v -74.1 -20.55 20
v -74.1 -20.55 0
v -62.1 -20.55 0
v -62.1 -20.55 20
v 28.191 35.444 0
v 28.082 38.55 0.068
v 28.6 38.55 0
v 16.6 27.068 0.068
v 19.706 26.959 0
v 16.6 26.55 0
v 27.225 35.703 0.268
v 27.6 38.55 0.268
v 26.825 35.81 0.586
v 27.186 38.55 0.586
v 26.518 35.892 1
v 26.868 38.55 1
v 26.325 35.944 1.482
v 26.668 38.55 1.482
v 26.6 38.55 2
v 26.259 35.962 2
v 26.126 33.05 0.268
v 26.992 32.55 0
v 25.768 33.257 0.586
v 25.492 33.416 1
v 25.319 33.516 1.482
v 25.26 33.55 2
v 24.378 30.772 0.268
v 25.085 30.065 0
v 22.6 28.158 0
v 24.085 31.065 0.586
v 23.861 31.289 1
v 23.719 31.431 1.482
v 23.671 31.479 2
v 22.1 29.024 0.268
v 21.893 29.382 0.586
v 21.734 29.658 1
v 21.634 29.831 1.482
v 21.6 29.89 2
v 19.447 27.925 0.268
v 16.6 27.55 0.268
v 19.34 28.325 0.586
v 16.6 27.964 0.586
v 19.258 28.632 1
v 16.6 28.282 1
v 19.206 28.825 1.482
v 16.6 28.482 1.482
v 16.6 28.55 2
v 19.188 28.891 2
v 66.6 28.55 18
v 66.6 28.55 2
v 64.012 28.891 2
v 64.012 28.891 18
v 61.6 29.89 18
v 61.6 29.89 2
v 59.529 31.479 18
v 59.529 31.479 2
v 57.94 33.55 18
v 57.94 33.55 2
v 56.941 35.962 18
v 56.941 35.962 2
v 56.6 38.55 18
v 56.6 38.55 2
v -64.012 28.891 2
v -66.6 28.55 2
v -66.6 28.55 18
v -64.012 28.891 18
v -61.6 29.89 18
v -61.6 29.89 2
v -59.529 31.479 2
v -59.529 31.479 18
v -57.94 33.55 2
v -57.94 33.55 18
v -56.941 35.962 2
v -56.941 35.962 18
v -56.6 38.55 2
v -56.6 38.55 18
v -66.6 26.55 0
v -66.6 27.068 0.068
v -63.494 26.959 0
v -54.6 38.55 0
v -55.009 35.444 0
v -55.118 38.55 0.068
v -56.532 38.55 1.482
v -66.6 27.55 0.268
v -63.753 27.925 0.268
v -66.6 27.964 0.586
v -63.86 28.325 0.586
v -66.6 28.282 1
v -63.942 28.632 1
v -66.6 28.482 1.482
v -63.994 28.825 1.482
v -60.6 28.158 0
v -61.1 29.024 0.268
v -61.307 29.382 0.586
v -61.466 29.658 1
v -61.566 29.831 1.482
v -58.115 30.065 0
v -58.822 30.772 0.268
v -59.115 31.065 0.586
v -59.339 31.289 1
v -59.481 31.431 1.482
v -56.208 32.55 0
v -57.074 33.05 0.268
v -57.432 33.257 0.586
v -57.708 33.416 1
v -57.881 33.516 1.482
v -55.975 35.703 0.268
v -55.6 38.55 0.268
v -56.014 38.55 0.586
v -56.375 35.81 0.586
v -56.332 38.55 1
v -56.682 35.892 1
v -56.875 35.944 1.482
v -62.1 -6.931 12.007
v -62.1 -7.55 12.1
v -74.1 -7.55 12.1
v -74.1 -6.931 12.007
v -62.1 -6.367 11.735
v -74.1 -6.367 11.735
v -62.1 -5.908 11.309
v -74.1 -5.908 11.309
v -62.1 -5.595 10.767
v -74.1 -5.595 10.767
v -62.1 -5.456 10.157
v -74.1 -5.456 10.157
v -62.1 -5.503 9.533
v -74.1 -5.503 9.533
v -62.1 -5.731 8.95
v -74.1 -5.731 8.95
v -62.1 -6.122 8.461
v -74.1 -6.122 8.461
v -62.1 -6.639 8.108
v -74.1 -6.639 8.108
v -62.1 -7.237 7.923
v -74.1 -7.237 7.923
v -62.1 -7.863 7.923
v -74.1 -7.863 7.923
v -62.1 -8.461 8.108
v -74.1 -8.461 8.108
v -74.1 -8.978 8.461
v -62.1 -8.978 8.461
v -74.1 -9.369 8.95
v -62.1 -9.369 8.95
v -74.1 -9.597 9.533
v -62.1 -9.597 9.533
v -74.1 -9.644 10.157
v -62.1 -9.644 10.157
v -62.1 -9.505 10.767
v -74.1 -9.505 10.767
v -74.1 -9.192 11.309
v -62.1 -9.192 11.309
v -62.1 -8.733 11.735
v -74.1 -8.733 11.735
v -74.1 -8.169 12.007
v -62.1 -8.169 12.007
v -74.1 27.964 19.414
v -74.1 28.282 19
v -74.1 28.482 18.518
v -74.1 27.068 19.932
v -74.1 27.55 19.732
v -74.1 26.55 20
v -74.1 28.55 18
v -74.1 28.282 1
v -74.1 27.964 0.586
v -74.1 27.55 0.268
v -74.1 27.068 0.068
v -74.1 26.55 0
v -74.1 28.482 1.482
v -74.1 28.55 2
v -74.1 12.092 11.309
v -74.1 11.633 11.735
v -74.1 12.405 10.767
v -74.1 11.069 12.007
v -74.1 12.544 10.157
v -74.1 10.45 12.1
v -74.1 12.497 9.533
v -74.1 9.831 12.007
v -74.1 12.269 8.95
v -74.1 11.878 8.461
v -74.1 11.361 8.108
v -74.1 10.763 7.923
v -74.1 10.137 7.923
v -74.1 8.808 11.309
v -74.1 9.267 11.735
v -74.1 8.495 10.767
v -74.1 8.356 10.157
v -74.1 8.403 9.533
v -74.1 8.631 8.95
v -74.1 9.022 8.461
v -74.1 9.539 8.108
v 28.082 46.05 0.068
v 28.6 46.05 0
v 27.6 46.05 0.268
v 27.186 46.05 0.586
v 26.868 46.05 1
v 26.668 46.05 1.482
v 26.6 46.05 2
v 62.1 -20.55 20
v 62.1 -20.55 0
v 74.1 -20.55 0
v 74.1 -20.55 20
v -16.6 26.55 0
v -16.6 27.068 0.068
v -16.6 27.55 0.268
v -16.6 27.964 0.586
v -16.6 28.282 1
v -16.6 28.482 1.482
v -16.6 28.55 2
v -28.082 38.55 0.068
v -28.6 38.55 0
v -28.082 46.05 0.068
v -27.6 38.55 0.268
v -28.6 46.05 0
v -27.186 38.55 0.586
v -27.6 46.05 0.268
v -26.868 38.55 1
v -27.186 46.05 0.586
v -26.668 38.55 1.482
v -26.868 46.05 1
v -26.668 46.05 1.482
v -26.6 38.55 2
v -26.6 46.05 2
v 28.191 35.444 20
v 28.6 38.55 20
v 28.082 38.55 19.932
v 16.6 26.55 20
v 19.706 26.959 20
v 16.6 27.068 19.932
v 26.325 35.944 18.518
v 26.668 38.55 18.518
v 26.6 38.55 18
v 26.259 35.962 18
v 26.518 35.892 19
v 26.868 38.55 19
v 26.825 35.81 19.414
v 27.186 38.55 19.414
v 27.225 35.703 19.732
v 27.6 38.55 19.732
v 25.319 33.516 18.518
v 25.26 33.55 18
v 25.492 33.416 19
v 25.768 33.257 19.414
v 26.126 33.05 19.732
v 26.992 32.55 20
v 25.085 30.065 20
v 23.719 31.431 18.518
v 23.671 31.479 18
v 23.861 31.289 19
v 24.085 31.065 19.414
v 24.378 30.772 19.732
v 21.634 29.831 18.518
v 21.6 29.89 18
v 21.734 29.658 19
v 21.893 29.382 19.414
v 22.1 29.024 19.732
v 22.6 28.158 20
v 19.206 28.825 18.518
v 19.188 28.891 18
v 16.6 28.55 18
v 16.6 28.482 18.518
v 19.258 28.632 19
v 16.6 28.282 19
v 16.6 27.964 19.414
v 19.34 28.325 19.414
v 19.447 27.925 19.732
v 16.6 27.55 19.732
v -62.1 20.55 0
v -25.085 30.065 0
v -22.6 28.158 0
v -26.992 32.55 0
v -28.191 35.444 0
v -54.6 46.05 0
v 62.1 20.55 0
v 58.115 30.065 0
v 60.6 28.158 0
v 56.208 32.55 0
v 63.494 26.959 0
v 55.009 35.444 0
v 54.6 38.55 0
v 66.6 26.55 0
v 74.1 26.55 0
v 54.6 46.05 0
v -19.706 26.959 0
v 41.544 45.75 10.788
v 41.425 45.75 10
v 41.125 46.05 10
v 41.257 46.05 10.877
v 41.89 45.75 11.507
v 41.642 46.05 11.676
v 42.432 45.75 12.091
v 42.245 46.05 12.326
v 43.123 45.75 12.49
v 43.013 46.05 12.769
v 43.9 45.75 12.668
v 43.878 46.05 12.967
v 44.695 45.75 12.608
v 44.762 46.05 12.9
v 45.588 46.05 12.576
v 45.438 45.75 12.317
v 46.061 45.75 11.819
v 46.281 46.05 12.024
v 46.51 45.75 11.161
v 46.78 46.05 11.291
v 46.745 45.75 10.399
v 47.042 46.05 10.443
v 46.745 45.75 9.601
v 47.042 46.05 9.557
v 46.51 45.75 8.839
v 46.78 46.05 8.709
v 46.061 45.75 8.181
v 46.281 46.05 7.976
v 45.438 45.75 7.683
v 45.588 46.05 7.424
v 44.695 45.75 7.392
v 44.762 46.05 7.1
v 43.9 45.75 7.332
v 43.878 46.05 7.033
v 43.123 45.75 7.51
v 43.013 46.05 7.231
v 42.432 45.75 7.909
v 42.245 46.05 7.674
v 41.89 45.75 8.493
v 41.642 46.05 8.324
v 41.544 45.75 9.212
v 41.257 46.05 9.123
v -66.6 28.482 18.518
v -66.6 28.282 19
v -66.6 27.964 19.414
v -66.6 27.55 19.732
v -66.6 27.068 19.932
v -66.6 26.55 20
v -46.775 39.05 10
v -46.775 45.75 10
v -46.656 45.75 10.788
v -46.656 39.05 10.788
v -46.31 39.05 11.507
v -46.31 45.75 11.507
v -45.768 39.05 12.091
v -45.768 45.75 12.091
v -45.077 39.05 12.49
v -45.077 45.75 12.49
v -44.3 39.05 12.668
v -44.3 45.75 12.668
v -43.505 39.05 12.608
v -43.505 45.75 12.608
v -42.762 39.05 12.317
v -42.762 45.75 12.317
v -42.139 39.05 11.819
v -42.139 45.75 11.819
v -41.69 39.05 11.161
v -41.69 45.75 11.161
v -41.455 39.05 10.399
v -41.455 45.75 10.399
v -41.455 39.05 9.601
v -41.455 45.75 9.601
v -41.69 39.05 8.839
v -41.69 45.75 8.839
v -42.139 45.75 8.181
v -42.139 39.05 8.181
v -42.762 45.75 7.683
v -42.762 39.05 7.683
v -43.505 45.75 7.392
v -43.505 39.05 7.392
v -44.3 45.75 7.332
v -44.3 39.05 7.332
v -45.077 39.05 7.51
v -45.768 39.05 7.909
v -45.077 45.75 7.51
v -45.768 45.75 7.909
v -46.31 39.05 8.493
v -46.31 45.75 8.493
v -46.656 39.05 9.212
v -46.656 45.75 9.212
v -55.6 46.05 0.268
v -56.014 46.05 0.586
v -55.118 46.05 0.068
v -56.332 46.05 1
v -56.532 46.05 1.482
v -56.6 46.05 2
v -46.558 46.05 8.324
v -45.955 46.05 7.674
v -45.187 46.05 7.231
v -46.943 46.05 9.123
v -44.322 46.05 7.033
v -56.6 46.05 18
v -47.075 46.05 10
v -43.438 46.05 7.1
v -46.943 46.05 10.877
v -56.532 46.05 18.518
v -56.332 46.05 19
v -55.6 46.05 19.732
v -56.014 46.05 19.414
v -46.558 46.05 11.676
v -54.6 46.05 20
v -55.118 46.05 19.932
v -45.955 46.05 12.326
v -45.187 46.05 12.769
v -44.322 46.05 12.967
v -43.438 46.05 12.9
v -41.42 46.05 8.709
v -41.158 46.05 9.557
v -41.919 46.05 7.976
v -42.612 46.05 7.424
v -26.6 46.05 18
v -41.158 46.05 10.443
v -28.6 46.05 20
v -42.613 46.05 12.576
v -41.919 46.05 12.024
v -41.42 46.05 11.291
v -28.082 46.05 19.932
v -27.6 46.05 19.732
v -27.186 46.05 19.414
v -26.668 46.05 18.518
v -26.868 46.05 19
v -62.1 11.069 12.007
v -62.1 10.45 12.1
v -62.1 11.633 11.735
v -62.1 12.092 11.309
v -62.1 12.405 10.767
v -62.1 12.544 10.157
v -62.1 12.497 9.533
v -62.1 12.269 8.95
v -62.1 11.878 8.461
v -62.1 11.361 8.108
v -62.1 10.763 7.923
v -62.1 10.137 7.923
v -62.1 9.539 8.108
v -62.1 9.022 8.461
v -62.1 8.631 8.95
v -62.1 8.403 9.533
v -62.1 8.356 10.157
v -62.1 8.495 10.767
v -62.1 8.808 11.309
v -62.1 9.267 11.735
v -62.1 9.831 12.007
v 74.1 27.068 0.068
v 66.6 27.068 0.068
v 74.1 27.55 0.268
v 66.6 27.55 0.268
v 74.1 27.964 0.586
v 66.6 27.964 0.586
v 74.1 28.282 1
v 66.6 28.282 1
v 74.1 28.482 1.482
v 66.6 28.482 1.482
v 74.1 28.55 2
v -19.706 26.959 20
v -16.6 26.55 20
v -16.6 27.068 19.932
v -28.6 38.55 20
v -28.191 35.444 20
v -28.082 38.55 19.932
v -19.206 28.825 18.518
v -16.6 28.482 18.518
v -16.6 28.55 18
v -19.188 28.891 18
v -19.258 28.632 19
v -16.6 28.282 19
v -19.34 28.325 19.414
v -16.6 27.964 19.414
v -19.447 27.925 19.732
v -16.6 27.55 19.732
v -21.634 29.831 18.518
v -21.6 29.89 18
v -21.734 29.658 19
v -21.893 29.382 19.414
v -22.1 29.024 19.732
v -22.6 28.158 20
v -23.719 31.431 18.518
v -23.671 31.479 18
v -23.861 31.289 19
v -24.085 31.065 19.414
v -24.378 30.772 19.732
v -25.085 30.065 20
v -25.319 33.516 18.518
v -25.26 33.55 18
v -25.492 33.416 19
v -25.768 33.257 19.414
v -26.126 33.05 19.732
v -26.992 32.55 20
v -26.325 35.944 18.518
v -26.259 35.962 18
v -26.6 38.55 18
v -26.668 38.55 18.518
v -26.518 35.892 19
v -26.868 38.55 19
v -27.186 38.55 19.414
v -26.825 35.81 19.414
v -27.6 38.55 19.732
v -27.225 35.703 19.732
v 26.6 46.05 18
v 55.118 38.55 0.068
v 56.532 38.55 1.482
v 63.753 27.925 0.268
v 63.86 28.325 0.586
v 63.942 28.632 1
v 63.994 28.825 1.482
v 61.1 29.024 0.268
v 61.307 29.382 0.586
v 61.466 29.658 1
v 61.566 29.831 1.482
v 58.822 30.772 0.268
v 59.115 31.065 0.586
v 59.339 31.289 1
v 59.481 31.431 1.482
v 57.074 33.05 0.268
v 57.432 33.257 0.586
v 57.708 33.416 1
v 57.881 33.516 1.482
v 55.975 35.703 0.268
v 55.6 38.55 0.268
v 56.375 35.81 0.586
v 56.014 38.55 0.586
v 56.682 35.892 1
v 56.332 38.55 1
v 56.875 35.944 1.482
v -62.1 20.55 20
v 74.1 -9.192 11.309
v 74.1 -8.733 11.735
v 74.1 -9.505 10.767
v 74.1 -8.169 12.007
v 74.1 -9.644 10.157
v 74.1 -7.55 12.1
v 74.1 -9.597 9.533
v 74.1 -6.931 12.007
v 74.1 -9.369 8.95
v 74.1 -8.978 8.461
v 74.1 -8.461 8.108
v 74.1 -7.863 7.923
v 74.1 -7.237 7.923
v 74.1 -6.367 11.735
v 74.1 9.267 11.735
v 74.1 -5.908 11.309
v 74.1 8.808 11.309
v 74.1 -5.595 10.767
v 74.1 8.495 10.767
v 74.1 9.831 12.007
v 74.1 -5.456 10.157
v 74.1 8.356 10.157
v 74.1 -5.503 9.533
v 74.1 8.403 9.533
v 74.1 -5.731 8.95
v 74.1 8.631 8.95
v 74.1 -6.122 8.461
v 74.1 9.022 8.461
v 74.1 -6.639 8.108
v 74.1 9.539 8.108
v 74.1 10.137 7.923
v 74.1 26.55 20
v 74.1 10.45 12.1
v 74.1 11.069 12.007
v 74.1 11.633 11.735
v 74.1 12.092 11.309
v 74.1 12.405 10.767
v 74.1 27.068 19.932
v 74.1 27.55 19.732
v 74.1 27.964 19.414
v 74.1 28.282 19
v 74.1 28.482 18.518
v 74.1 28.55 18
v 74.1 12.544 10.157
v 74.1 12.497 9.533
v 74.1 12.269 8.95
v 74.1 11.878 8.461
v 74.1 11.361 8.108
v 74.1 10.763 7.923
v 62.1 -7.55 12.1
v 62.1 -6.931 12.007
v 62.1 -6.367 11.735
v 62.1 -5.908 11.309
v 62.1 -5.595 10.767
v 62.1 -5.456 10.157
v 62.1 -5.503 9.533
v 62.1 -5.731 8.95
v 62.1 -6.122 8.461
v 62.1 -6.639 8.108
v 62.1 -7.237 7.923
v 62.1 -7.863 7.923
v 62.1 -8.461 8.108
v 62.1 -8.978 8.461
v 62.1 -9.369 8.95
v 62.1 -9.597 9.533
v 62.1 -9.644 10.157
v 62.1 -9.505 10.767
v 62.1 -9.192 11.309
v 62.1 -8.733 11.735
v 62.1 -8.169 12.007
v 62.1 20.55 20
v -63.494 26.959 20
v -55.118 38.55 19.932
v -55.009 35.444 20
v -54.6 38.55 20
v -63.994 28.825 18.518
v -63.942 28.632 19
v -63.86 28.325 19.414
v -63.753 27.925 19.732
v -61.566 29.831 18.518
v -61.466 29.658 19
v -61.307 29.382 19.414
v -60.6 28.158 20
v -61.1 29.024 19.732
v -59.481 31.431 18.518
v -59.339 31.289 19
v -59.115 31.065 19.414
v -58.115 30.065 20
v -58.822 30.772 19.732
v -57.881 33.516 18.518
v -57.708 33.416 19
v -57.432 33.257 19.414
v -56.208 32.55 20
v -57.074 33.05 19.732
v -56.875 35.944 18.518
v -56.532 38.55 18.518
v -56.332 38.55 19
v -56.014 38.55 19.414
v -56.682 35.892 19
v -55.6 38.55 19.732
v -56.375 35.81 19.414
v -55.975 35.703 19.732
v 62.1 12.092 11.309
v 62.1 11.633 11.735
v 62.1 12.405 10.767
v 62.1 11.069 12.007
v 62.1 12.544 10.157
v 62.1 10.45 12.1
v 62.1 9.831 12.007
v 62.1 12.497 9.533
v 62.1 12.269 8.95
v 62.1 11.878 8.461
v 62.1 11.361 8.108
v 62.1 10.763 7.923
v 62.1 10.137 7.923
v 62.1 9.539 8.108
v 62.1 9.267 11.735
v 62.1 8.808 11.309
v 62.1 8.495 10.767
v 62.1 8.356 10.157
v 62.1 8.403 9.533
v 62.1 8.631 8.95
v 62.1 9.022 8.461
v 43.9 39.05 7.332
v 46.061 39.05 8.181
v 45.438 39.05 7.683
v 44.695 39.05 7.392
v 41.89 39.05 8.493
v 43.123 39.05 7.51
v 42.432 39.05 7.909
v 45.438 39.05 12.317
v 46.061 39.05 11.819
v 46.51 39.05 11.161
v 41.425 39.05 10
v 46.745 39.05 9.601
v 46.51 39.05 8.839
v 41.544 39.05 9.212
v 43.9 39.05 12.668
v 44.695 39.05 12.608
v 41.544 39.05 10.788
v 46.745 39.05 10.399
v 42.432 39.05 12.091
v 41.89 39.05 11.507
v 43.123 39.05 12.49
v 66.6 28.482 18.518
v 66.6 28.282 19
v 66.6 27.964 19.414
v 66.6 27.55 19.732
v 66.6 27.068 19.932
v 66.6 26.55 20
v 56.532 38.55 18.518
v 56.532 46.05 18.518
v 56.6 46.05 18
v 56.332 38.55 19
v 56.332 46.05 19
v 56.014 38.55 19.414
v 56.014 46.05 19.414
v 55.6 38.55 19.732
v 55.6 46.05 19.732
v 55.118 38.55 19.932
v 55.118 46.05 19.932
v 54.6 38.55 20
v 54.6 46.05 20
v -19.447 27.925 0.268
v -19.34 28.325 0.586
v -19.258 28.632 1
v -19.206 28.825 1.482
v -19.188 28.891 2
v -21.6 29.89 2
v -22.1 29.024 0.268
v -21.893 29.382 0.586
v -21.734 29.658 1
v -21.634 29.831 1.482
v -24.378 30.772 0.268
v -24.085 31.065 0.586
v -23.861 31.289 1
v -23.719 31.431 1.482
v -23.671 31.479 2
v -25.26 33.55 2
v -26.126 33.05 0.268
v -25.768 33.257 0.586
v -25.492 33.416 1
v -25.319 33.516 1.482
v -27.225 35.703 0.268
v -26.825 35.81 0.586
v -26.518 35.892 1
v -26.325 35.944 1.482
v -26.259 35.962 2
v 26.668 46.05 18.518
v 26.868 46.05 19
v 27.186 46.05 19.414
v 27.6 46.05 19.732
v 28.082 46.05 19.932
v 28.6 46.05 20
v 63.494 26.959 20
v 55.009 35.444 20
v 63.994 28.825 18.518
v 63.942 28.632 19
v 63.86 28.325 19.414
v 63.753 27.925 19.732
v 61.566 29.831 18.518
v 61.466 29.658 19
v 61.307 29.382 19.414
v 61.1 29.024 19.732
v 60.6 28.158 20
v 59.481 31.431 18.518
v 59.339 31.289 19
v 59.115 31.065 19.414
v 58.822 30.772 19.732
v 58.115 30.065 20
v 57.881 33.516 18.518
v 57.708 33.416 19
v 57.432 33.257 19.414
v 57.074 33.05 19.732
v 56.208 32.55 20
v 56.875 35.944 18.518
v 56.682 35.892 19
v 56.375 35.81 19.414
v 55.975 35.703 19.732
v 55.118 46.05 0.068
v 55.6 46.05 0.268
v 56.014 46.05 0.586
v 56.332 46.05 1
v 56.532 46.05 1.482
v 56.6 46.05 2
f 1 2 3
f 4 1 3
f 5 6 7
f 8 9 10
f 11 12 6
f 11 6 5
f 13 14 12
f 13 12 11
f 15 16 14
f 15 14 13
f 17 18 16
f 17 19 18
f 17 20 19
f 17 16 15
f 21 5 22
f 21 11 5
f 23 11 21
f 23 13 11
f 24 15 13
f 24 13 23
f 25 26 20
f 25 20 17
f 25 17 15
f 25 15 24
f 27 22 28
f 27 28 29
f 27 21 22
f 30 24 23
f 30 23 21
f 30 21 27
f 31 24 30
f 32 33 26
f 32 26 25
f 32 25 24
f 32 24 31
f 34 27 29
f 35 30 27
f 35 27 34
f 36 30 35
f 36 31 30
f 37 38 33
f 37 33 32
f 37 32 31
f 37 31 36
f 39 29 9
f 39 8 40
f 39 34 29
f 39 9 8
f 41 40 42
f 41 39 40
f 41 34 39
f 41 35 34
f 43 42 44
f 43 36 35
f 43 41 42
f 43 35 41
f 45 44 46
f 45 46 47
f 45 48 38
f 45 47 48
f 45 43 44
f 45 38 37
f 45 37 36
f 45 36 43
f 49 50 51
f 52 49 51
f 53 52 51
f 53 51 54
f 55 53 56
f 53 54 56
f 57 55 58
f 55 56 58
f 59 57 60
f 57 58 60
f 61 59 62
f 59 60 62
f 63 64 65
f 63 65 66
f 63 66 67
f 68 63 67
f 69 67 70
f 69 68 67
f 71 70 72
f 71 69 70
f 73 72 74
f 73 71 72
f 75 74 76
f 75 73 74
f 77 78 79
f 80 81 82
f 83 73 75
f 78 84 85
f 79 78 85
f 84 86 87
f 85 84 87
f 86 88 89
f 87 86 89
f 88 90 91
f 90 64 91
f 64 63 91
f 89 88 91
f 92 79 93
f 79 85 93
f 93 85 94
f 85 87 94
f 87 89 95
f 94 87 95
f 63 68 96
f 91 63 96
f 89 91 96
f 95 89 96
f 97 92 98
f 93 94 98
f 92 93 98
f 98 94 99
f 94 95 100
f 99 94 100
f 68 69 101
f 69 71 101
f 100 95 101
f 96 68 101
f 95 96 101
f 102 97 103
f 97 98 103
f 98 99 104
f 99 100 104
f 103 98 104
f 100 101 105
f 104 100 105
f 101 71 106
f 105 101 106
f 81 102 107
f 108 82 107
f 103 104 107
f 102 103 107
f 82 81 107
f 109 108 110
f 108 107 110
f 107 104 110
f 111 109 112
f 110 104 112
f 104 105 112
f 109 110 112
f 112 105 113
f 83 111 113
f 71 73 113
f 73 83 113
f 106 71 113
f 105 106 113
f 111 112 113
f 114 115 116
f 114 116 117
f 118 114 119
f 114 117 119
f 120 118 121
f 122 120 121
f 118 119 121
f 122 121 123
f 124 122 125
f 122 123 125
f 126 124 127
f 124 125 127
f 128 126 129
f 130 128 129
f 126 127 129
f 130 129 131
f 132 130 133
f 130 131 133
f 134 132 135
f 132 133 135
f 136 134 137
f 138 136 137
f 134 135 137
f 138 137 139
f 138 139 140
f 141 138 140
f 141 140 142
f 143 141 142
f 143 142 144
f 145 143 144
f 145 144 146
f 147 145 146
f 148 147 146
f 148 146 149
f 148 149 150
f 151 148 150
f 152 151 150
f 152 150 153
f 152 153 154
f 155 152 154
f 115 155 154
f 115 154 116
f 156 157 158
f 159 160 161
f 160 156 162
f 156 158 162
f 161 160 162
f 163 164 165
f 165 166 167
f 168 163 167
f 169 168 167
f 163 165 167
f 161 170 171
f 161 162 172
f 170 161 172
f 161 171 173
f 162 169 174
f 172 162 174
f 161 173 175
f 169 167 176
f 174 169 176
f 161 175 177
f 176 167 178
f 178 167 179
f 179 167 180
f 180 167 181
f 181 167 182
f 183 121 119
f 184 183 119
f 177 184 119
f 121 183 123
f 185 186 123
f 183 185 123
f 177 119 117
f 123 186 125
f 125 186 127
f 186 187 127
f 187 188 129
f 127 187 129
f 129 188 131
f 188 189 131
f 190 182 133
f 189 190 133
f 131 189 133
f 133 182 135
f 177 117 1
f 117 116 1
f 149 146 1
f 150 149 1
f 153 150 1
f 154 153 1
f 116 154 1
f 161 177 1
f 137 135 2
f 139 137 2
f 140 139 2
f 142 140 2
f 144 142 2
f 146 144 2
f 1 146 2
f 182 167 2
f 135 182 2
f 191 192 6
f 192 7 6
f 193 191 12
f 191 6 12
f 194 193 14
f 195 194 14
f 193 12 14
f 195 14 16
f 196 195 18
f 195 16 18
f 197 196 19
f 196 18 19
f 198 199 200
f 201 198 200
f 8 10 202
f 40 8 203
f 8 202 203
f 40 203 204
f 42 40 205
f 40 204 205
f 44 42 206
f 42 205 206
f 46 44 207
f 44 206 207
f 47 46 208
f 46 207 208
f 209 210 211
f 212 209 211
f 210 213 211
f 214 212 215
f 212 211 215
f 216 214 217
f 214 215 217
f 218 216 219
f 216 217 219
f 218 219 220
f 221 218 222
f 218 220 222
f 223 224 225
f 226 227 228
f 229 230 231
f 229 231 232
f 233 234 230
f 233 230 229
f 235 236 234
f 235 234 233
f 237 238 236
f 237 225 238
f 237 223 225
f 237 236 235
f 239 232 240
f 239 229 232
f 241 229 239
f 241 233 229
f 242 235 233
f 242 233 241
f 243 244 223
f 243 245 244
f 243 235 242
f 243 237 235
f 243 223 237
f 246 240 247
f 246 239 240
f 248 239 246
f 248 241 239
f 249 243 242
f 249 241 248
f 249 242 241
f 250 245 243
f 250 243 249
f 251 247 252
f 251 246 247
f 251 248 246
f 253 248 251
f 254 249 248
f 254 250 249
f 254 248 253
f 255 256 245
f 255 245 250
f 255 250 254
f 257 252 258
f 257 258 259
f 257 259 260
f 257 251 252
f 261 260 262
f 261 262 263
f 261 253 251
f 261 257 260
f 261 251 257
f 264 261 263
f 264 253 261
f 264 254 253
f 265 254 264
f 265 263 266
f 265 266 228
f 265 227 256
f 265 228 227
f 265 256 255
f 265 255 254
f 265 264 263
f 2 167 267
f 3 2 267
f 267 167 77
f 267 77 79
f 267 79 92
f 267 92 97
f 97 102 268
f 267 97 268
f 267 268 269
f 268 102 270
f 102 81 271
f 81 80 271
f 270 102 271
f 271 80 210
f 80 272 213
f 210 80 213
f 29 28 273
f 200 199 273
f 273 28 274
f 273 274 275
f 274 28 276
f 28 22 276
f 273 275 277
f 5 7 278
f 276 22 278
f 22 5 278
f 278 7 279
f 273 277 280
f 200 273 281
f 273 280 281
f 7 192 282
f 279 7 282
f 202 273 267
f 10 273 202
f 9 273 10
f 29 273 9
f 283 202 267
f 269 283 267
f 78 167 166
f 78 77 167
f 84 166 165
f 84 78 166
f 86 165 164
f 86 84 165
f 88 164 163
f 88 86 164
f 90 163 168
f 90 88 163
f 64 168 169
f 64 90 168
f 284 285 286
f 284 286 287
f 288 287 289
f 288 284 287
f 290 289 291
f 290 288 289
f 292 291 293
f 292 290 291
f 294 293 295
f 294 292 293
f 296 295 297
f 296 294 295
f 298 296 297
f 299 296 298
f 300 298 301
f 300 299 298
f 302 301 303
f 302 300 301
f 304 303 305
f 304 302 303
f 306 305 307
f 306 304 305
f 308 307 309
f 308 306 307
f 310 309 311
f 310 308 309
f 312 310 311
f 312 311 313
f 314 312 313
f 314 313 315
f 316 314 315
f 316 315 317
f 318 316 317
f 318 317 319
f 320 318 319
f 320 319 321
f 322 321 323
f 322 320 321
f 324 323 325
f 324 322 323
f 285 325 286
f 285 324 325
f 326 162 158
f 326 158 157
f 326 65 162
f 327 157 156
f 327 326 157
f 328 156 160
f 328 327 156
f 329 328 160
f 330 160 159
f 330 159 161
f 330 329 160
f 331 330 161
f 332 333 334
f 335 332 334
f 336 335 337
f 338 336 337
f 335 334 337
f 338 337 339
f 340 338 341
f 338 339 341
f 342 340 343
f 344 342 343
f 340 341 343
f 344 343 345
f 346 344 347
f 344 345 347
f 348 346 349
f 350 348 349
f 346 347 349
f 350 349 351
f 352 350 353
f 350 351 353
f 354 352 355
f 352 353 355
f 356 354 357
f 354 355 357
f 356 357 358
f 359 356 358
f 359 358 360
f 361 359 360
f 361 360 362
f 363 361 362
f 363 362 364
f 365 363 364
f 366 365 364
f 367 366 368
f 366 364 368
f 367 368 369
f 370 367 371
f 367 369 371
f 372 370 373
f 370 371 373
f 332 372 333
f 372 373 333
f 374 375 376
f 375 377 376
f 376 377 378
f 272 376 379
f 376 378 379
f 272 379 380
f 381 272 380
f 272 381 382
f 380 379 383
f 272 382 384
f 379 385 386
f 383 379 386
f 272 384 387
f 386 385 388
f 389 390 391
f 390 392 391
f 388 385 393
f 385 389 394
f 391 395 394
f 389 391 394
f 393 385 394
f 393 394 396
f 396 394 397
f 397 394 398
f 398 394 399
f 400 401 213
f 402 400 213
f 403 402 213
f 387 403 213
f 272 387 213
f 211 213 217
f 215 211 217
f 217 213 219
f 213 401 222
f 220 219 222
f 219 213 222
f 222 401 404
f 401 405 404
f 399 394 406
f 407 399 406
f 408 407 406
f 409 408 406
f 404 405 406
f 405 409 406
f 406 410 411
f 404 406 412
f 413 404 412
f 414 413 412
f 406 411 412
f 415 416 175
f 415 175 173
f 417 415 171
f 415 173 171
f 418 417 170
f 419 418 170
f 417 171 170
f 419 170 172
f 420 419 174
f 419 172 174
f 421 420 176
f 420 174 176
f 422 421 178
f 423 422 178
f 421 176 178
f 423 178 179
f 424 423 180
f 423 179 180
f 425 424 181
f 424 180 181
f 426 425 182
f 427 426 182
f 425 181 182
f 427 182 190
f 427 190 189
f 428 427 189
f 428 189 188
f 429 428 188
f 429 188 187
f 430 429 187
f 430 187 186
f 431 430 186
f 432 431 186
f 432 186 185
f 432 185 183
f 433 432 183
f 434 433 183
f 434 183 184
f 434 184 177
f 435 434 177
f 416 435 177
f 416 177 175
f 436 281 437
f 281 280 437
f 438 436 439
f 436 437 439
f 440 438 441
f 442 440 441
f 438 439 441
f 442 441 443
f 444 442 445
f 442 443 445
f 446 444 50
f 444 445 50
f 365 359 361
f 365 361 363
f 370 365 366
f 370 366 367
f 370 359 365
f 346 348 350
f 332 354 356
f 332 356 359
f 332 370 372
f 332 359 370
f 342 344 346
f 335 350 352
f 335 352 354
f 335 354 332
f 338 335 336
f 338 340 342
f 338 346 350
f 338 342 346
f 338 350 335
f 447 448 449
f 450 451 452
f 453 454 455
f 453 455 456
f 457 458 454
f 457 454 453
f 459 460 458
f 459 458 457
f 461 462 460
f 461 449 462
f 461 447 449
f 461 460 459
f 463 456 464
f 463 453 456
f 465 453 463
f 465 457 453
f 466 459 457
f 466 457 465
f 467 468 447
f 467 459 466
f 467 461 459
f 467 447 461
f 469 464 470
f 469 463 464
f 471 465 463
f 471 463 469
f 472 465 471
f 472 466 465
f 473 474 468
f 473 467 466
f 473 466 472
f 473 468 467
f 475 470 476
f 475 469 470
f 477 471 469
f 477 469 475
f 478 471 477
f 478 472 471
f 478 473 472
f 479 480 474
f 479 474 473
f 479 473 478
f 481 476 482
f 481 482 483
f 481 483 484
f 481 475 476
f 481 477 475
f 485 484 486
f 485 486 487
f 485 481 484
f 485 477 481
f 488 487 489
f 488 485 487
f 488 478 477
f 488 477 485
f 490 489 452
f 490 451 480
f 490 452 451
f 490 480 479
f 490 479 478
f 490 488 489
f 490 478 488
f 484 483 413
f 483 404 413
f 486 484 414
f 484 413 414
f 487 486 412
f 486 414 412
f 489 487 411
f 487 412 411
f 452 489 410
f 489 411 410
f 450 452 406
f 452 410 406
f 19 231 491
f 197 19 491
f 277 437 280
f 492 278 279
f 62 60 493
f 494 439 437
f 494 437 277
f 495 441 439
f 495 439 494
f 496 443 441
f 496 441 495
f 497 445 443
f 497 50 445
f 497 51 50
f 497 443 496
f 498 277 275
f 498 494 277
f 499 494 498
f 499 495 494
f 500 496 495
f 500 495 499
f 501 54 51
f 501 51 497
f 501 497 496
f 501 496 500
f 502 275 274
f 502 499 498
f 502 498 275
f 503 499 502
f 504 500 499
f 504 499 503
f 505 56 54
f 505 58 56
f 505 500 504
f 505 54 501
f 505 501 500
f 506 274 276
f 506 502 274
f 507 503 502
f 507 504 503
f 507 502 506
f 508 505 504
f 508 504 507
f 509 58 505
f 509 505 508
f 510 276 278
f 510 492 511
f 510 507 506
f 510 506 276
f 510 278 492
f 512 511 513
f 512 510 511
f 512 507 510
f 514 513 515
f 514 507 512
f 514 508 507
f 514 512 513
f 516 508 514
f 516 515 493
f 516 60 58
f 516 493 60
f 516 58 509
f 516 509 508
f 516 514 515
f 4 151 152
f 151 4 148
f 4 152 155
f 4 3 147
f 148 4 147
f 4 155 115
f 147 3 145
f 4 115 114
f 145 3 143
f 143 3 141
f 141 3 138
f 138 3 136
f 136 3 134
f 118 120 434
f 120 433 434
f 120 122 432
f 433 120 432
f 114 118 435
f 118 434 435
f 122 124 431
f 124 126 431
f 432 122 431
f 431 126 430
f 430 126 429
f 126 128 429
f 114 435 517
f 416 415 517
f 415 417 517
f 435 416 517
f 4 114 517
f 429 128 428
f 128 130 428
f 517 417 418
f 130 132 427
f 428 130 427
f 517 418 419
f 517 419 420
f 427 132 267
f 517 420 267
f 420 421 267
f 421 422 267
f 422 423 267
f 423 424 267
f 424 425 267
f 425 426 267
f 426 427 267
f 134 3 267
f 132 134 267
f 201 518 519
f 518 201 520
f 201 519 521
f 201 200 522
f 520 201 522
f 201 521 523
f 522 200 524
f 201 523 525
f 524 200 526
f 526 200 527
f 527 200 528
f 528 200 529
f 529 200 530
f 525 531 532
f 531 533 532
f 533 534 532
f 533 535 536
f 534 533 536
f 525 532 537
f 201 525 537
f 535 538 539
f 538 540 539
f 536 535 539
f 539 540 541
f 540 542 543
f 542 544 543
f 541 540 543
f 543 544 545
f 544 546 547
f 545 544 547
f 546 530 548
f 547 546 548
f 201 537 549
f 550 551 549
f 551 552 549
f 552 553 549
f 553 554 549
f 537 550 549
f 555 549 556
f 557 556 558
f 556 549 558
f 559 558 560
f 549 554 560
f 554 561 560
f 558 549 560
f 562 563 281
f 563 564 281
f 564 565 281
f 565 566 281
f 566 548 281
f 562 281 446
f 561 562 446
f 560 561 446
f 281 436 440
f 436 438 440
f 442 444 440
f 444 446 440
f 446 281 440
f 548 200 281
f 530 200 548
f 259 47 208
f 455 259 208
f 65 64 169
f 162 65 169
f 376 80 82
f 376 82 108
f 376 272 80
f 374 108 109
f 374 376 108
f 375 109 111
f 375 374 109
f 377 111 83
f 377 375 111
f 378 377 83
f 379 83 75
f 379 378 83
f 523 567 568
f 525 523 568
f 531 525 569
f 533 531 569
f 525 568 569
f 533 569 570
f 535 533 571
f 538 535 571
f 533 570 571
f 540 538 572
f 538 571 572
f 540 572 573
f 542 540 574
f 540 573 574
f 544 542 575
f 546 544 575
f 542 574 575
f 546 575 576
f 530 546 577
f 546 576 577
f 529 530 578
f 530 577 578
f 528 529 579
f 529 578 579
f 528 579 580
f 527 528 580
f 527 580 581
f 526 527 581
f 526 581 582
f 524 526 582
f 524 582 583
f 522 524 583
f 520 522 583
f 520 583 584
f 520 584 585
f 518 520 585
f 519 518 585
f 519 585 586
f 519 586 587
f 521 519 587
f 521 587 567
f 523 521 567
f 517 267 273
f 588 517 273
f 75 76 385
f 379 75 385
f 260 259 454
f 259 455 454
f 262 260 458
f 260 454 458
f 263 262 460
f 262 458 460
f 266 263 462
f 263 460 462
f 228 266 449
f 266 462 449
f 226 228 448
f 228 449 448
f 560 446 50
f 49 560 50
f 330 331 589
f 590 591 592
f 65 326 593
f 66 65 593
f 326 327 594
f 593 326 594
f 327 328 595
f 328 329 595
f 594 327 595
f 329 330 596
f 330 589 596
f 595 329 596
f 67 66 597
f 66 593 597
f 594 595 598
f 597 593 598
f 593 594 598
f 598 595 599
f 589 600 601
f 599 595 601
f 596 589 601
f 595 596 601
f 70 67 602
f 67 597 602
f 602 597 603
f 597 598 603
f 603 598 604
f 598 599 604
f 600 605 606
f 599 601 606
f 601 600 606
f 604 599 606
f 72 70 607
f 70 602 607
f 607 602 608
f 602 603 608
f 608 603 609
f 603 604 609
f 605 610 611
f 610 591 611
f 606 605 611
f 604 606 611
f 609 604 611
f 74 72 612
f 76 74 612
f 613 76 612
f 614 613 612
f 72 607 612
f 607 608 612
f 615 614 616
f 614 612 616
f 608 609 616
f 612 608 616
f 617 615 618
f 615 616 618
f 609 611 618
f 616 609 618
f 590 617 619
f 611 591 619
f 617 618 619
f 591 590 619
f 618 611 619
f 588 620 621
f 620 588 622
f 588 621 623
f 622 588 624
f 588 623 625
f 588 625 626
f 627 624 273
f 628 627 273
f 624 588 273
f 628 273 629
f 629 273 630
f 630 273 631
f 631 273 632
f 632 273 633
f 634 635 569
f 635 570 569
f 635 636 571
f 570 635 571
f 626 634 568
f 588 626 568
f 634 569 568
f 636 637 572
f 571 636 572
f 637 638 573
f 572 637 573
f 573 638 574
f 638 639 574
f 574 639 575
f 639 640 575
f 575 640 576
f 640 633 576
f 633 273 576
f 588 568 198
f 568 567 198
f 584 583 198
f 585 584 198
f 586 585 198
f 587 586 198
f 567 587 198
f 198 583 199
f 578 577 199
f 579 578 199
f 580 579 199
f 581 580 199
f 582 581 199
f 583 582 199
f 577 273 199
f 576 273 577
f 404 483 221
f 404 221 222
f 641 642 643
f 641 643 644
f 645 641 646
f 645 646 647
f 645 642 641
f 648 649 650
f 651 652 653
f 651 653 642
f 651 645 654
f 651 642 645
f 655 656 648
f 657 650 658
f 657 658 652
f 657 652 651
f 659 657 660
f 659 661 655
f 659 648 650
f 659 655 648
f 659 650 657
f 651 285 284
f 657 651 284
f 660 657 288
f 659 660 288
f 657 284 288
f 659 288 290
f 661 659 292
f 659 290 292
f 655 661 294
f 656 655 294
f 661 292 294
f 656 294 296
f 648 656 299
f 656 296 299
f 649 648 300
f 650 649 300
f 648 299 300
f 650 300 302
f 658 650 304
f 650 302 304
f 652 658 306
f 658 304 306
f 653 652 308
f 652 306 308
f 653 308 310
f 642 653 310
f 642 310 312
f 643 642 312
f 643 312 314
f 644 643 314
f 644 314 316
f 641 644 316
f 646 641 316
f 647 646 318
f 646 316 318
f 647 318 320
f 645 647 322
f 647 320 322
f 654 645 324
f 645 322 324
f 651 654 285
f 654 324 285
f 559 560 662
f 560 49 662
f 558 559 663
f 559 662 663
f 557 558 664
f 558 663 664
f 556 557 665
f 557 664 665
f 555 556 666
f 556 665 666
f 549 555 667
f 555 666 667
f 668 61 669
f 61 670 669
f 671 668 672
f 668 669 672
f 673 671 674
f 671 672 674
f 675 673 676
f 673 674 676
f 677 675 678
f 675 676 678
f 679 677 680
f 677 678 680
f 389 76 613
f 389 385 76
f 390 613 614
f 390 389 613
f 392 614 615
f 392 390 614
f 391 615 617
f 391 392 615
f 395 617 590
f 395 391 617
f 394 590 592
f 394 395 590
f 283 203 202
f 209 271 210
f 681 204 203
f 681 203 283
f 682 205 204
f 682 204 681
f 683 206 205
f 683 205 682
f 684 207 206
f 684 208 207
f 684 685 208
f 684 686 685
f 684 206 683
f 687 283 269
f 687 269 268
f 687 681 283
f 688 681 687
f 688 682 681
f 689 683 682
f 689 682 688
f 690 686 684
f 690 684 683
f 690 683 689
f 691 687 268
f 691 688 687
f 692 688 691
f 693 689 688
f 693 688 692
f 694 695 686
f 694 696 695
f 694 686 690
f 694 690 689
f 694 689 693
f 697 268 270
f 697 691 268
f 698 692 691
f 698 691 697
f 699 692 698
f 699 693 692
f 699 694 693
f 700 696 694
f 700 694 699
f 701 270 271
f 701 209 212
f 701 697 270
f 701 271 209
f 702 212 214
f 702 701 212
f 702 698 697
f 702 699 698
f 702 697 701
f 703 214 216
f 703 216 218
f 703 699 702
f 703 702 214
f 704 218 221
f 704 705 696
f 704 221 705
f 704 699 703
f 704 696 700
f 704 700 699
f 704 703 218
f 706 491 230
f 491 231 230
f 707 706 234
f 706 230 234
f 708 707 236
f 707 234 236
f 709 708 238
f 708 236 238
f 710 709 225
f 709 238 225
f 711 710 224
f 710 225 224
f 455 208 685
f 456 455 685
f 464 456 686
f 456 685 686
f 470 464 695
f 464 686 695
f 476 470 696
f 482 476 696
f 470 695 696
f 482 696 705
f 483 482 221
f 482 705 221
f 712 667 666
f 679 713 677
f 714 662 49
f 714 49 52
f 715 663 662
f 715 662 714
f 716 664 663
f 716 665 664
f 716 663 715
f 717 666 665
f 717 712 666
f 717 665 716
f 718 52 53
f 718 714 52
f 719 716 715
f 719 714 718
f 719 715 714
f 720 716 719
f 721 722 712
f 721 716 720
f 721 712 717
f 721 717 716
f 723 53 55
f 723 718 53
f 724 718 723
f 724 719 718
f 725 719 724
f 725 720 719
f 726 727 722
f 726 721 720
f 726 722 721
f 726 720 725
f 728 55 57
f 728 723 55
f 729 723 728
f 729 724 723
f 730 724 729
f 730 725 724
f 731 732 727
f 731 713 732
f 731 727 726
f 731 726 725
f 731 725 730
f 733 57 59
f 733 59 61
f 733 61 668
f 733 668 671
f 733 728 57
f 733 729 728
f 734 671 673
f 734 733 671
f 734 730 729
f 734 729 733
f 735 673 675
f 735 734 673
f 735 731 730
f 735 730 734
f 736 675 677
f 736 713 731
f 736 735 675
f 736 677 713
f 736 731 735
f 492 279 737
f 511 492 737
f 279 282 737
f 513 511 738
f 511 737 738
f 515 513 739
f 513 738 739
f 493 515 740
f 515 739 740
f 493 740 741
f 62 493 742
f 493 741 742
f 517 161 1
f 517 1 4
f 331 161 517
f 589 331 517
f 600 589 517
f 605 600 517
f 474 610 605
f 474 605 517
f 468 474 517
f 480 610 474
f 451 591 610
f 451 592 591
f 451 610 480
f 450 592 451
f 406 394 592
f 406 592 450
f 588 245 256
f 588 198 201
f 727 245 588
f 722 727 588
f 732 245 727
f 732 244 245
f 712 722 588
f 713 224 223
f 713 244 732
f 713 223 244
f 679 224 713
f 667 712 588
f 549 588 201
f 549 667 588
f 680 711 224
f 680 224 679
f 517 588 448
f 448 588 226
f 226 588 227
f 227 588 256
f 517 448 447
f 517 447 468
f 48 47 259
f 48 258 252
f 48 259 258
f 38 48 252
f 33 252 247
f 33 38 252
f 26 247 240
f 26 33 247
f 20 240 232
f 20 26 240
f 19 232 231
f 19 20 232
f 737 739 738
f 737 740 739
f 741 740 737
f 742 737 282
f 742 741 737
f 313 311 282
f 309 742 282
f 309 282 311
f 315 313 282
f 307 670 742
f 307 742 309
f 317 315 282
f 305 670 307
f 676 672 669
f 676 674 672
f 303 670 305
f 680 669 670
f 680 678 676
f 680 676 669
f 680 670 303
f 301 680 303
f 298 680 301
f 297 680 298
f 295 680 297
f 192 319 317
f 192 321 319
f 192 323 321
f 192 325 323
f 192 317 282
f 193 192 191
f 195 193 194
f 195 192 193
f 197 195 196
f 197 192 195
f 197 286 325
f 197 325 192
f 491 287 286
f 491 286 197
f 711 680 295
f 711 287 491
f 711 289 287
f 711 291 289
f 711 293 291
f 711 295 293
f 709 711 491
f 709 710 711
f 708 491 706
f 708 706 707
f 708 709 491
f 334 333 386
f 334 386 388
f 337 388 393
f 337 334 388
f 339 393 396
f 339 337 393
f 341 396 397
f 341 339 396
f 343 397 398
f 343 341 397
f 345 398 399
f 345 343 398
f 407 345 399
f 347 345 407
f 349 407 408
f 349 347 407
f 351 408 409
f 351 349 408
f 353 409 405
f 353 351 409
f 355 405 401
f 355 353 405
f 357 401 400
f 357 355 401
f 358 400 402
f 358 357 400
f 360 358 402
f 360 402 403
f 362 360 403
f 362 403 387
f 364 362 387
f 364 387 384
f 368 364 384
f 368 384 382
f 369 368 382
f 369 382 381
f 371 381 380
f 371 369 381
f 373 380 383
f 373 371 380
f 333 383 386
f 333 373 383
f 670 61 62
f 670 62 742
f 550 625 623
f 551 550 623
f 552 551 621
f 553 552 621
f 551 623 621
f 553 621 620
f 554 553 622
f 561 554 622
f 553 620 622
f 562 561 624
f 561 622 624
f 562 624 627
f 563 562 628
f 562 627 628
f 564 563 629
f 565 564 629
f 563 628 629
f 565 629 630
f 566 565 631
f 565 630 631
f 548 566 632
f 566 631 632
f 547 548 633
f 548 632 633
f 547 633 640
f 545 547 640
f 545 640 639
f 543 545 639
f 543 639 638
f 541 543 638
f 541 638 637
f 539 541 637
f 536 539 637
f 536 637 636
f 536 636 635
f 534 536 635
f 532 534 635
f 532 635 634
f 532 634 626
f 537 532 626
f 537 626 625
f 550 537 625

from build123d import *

# Parameters (mm, degrees)
BOSS_EXTRUDE1_DEPTH  = 20
SKETCH2_R            = 2.1
CUT_EXTRUDE1_DEPTH   = 149
SKETCH3_W            = 30
SKETCH3_H            = 17.5
BOSS_EXTRUDE2_DEPTH  = 20
FILLET1_R            = 10
FILLET1_OF_MIRROR1_R = 10
FILLET2_R            = 2
SKETCH4_R            = 2.675
CUT_EXTRUDE2_DEPTH   = 7
CHAMFER1_SIZE        = 0.3


with BuildPart() as part:
    # Sketch1 → Boss-Extrude1 (new body)
    with BuildSketch(Plane.XY):
        Polygon((-74.1, 28.55), (-74.1, -20.55), (-62.1, -20.55), (-62.1, 20.55), (62.1, 20.55), (62.1, -20.55), (74.1, -20.55), (74.1, 28.55), align=None)
    extrude(amount=BOSS_EXTRUDE1_DEPTH)

    # Sketch2 → Cut-Extrude1 (cut)
    with BuildSketch(Plane.ZY.offset(74.1)):
        with Locations((10, 10.45)):
            Circle(SKETCH2_R)
        with Locations((10, -7.55)):
            Circle(SKETCH2_R)
    extrude(amount=-CUT_EXTRUDE1_DEPTH, mode=Mode.SUBTRACT)

    # Sketch3 → Boss-Extrude2 (add)
    with BuildSketch(Plane.XY.offset(20)):
        with Locations((-41.6, 37.3)):
            Rectangle(SKETCH3_W, SKETCH3_H)
    boss_extrude2 = extrude(amount=-BOSS_EXTRUDE2_DEPTH)

    # Fillet1
    fillet1_edges = [part.edges().sort_by_distance(p)[0] for p in [
        (-26.6, 28.55, 10),
        (-56.6, 28.55, 10),
    ]]
    fillet(fillet1_edges, radius=FILLET1_R)

    # Mirror1: Boss-Extrude2 across plane
    add(boss_extrude2.mirror(Plane(origin=(0, 0, 0), x_dir=(0, 0, 1), z_dir=(1, 0, 0))))

    # Fillet1 of Mirror1
    fillet1_of_mirror1_edges = [part.edges().sort_by_distance(p)[0] for p in [
        (26.6, 28.55, 10),
        (56.6, 28.55, 10),
    ]]
    fillet(fillet1_of_mirror1_edges, radius=FILLET1_OF_MIRROR1_R)

    # Fillet2
    fillet2_edges = [part.edges().sort_by_distance(p)[0] for p in [
        (70.35, 28.55, 20),
        (-56.6, 42.3, 0),
        (-56.6, 42.3, 20),
        (-26.6, 42.3, 20),
        (-26.6, 42.3, 0),
        (-70.35, 28.55, 0),
        (-70.35, 28.55, 20),
        (-23.671067812, 31.478932188, 20),
        (-23.671067812, 31.478932188, 0),
        (-59.528932188, 31.478932188, 20),
        (-59.528932188, 31.478932188, 0),
        (56.6, 42.3, 20),
        (56.6, 42.3, 0),
        (26.6, 42.3, 20),
        (26.6, 42.3, 0),
        (0, 28.55, 0),
        (0, 28.55, 20),
        (23.671067812, 31.478932188, 20),
        (23.671067812, 31.478932188, 0),
        (59.528932188, 31.478932188, 20),
        (59.528932188, 31.478932188, 0),
        (70.35, 28.55, 0),
    ]]
    fillet(fillet2_edges, radius=FILLET2_R)

    # Sketch4 → Cut-Extrude2 (cut)
    with BuildSketch(Plane(origin=(0, 46.05, 0), x_dir=(1, 0, 0), z_dir=(0, 1, 0))):
        with Locations(Location((44.1, -10, 0), (0, 0, 180))):
            Circle(SKETCH4_R)
        with Locations(Location((-44.1, -10, 0), (0, 0, 180))):
            Circle(SKETCH4_R)
    extrude(amount=-CUT_EXTRUDE2_DEPTH, mode=Mode.SUBTRACT)

    # Chamfer1
    chamfer1_edges = [part.edges().sort_by_distance(p)[0] for p in [
        (46.775, 46.05, 10),
        (-41.425, 46.05, 10),
    ]]
    chamfer(chamfer1_edges, length=CHAMFER1_SIZE)


solid = part.part
